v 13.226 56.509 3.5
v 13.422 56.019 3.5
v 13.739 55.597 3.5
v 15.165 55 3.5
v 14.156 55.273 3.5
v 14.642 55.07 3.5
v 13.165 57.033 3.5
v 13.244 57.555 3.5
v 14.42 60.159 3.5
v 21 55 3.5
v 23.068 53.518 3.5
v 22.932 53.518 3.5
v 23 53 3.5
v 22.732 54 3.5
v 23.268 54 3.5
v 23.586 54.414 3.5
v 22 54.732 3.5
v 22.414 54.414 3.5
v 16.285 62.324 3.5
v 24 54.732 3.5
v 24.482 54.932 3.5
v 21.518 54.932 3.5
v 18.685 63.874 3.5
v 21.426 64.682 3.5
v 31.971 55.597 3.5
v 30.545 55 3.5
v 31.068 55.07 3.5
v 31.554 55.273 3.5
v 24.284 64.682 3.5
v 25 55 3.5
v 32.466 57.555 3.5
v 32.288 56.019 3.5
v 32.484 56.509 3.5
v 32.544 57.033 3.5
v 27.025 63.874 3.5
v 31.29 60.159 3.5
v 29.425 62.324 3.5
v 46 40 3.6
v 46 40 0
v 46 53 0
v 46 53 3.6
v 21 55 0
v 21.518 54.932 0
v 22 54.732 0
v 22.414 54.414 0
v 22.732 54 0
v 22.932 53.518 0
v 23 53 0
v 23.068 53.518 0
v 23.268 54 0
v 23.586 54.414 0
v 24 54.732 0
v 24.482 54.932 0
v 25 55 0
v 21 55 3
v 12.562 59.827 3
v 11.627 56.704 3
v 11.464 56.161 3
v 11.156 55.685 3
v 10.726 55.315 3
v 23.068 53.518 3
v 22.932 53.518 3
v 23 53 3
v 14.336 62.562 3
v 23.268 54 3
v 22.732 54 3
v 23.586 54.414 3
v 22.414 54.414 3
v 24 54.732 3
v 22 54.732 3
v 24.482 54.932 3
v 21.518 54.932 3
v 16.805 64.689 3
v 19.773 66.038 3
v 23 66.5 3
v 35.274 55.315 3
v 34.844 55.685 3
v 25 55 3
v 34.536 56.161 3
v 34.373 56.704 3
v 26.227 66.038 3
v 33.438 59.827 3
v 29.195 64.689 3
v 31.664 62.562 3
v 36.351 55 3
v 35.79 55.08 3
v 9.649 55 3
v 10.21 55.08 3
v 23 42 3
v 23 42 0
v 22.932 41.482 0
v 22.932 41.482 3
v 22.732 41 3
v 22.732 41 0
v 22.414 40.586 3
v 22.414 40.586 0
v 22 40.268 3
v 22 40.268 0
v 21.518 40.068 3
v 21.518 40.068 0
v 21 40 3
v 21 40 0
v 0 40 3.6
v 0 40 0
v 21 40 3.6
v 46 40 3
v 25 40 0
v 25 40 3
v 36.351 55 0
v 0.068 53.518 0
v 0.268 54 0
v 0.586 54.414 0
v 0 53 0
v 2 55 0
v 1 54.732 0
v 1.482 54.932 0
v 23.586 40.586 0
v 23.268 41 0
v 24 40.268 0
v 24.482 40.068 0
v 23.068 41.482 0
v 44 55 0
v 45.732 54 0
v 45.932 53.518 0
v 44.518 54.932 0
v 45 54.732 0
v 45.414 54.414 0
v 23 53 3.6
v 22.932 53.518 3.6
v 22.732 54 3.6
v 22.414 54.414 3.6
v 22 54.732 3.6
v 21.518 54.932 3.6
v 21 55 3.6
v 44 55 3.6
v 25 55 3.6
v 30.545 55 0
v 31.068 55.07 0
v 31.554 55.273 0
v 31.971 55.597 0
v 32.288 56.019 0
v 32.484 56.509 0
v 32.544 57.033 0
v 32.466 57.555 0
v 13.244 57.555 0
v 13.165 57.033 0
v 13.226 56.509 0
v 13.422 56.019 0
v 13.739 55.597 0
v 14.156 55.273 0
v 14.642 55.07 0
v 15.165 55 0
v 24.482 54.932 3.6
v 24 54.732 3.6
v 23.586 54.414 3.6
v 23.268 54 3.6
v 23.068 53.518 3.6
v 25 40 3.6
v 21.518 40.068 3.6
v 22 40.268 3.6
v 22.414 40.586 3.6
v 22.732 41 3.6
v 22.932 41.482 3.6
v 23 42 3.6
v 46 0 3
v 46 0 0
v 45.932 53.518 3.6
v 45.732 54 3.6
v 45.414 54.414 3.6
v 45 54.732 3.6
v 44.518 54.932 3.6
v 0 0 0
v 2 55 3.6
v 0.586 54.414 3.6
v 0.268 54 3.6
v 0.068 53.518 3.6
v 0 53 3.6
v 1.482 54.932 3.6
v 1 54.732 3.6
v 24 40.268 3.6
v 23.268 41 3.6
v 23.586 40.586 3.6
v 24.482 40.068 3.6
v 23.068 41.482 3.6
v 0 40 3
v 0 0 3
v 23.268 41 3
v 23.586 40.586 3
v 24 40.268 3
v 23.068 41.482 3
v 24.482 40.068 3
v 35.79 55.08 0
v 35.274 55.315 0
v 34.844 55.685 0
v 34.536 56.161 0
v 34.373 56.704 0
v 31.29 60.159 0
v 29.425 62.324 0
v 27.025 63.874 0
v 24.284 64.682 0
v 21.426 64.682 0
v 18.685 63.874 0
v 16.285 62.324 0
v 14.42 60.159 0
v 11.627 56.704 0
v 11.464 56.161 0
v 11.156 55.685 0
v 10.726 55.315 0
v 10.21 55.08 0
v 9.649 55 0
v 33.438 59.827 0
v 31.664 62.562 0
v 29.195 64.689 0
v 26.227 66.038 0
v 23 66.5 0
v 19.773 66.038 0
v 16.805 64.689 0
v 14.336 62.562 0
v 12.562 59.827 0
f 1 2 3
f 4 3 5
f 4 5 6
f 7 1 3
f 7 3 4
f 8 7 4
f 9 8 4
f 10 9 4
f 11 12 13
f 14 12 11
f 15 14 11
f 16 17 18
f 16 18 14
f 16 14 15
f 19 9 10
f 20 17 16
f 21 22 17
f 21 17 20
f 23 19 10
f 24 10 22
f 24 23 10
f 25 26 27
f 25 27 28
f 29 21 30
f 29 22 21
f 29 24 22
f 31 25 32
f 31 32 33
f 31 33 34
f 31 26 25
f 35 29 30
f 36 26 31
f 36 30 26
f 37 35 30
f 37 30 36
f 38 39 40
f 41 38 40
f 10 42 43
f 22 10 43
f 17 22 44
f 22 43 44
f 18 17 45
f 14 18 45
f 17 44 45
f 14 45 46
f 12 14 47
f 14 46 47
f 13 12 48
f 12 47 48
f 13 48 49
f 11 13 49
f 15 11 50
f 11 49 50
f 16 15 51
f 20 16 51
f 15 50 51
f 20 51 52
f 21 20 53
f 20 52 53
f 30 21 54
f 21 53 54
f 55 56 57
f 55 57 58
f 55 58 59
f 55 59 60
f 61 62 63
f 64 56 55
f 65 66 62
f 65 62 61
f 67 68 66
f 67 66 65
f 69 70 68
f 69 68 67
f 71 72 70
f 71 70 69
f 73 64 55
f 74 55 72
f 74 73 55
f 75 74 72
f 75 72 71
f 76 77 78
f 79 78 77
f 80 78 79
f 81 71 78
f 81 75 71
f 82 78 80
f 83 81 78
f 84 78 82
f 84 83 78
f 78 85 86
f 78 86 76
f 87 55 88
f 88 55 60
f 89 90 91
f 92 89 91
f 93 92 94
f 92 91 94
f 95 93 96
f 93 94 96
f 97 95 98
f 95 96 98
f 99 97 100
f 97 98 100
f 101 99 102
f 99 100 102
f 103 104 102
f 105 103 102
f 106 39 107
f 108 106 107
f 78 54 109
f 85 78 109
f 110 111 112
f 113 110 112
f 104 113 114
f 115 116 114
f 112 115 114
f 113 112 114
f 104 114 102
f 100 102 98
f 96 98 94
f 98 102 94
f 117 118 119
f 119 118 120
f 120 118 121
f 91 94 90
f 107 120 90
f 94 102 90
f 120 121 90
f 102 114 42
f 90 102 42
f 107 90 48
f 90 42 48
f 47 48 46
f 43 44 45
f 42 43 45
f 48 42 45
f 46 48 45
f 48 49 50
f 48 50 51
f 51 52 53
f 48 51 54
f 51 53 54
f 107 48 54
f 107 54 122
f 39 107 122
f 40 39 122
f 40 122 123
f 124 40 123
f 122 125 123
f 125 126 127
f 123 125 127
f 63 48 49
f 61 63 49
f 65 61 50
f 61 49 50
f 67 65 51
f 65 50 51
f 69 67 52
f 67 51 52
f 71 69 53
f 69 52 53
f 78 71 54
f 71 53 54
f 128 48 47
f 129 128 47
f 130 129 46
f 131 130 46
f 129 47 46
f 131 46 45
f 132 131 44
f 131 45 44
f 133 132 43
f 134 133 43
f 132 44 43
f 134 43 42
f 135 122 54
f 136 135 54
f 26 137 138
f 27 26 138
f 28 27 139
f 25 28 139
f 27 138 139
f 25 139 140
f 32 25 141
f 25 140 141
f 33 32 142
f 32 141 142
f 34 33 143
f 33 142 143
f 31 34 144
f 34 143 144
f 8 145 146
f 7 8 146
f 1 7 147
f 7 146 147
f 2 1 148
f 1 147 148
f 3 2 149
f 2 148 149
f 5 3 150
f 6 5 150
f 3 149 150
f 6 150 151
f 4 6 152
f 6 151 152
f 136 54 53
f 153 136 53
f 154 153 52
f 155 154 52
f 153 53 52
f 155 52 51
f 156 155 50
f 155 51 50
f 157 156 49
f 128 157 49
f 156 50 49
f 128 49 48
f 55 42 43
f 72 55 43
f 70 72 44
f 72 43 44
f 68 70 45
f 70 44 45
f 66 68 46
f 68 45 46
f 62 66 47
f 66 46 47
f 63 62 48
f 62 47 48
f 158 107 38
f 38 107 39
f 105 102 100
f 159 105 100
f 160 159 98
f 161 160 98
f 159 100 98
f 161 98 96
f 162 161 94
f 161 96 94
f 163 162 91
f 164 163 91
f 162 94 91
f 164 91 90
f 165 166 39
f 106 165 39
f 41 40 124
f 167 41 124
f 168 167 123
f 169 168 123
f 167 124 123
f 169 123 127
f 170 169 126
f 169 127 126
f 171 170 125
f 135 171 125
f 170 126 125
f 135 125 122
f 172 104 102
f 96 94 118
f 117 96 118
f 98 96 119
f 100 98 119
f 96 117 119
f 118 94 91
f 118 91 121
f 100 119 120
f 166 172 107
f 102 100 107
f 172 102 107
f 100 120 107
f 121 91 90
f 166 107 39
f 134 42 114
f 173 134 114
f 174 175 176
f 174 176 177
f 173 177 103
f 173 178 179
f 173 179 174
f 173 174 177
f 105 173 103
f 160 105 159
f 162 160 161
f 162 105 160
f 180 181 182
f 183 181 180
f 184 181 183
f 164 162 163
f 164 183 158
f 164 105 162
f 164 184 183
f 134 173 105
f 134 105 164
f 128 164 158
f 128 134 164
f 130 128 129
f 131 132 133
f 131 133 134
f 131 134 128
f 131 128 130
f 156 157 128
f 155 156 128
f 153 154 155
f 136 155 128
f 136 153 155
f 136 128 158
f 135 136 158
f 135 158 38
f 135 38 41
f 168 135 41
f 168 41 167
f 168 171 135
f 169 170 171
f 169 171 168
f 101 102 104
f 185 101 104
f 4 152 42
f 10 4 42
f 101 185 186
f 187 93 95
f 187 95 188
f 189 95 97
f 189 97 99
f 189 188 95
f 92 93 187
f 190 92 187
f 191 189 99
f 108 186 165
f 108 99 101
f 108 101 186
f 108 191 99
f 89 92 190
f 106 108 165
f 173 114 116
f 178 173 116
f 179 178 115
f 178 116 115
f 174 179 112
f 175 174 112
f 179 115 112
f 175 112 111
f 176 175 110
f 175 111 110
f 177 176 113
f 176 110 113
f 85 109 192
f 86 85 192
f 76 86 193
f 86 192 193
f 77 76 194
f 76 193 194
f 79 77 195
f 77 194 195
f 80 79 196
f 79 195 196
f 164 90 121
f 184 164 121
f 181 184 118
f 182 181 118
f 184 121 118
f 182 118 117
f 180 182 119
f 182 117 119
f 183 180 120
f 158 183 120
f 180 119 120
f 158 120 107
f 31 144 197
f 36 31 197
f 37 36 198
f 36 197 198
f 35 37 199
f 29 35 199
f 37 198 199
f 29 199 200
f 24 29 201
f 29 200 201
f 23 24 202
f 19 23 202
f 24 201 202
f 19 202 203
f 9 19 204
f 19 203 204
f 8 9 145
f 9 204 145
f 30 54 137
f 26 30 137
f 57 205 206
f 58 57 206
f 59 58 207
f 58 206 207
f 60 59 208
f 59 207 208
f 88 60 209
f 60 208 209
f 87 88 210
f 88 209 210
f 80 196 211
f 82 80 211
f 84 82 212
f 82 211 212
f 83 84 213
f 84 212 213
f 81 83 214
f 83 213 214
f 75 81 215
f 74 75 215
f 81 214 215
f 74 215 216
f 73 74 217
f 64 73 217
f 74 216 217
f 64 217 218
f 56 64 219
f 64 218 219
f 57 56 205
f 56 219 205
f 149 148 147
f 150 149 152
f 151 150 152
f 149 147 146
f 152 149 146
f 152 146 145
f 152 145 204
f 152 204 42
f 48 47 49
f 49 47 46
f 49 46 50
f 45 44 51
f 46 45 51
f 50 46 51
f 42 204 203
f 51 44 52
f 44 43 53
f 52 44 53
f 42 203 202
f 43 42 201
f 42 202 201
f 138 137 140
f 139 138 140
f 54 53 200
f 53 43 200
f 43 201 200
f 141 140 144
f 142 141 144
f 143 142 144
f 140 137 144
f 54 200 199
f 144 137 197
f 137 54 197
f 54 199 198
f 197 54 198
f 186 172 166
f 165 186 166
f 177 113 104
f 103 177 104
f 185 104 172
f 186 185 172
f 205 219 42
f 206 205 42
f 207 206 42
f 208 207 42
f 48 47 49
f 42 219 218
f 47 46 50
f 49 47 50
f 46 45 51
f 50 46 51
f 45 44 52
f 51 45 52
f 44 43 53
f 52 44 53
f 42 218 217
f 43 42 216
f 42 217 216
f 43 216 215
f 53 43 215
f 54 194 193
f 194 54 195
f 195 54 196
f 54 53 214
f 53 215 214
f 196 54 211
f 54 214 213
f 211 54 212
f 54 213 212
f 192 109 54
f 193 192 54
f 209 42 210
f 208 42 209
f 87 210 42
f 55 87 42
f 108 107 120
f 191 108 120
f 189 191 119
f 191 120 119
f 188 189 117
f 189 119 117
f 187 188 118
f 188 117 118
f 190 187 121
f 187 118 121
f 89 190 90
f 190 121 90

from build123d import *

# Parameters (mm, degrees)
F0_W     = 42.0281105638
F0_H     = 33.6269846465
F1_DEPTH = 3
F2_DEPTH = 3.6
F3_DEPTH = 3.5


# Not quite as in the source:
# - the program builds the solid bodies; features that only make, move or delete a surface that nothing else refers to are left out


with BuildPart() as f1:
    # F0 (on Top) → F1 (new body)
    with BuildSketch(Plane.XY):
        with BuildLine():
            Line((0, 40), (0, 0))
            Line((0, 0), (46, 0))
            Line((46, 0), (46, 40))
            Line((46, 40), (43, 40))
            Line((43, 40), (25, 40))
            ThreePointArc((25, 40), (23.5857864376, 40.5857864376), (23, 42))
            ThreePointArc((23, 42), (22.4142135624, 40.5857864376), (21, 40))
            Line((21, 40), (3, 40))
            Line((3, 40), (0, 40))
        make_face()
        with Locations((23, 19.8172420869)):
            Rectangle(F0_W, F0_H, mode=Mode.SUBTRACT)
        with Locations((23, 19.8172420869)):
            Rectangle(F0_W, F0_H)
    extrude(amount=F1_DEPTH)


with BuildPart() as f1b:
    # F0 (on Top) → F1, piece 2 (new body)
    with BuildSketch(Plane.XY):
        with BuildLine():
            ThreePointArc((13.2436284078, 57.5546079039), (13.5668788118, 55.7977553926), (15.1651928936, 55))
            Line((15.1651928936, 55), (21, 55))
            ThreePointArc((21, 55), (22.4142135624, 54.4142135624), (23, 53))
            ThreePointArc((23, 53), (23.5857864376, 54.4142135624), (25, 55))
            Line((25, 55), (30.5447365354, 55))
            ThreePointArc((30.5447365354, 55), (32.1430506172, 55.7977553926), (32.4663010212, 57.5546079039))
            ThreePointArc((32.4663010212, 57.5546079039), (22.8549647145, 64.7842115073), (13.2436284078, 57.5546079039))
        make_face()
        with BuildLine():
            ThreePointArc((11.6269004361, 56.7037037037), (10.954230091, 55.4846464781), (9.6489700772, 55))
            Line((9.6489700772, 55), (15.1651928936, 55))
            ThreePointArc((15.1651928936, 55), (13.5668788118, 55.7977553926), (13.2436284078, 57.5546079039))
            ThreePointArc((13.2436284078, 57.5546079039), (22.8549647145, 64.7842115073), (32.4663010212, 57.5546079039))
            ThreePointArc((32.4663010212, 57.5546079039), (32.1430506172, 55.7977553926), (30.5447365354, 55))
            Line((30.5447365354, 55), (36.3510299228, 55))
            ThreePointArc((36.3510299228, 55), (35.045769909, 55.4846464781), (34.3730995639, 56.7037037037))
            ThreePointArc((34.3730995639, 56.7037037037), (23, 66.5), (11.6269004361, 56.7037037037))
        make_face()
    extrude(amount=F1_DEPTH)


with BuildPart() as f2:
    # F0 (on Top) → F2 (new body)
    with BuildSketch(Plane.XY):
        with BuildLine():
            Line((0, 53), (0, 40))
            Line((0, 40), (3, 40))
            Line((3, 40), (21, 40))
            ThreePointArc((21, 40), (22.4142135624, 40.5857864376), (23, 42))
            Line((23, 42), (23, 53))
            ThreePointArc((23, 53), (22.4142135624, 54.4142135624), (21, 55))
            Line((21, 55), (15.1651928936, 55))
            Line((15.1651928936, 55), (9.6489700772, 55))
            Line((9.6489700772, 55), (2, 55))
            ThreePointArc((2, 55), (0.5857864376, 54.4142135624), (0, 53))
        make_face()
        with BuildLine():
            Line((43, 40), (46, 40))
            Line((46, 40), (46, 53))
            ThreePointArc((46, 53), (45.4142135624, 54.4142135624), (44, 55))
            Line((44, 55), (36.3510299228, 55))
            Line((36.3510299228, 55), (30.5447365354, 55))
            Line((30.5447365354, 55), (25, 55))
            ThreePointArc((25, 55), (23.5857864376, 54.4142135624), (23, 53))
            Line((23, 53), (23, 42))
            ThreePointArc((23, 42), (23.5857864376, 40.5857864376), (25, 40))
            Line((25, 40), (43, 40))
        make_face()
    extrude(amount=F2_DEPTH)


with BuildPart() as f3:
    # F0 (on Top) → F3 (new body)
    with BuildSketch(Plane.XY):
        with BuildLine():
            ThreePointArc((13.2436284078, 57.5546079039), (13.5668788118, 55.7977553926), (15.1651928936, 55))
            Line((15.1651928936, 55), (21, 55))
            ThreePointArc((21, 55), (22.4142135624, 54.4142135624), (23, 53))
            ThreePointArc((23, 53), (23.5857864376, 54.4142135624), (25, 55))
            Line((25, 55), (30.5447365354, 55))
            ThreePointArc((30.5447365354, 55), (32.1430506172, 55.7977553926), (32.4663010212, 57.5546079039))
            ThreePointArc((32.4663010212, 57.5546079039), (22.8549647145, 64.7842115073), (13.2436284078, 57.5546079039))
        make_face()
    extrude(amount=F3_DEPTH)


solid = Compound([f1.part, f1b.part, f2.part, f3.part])
